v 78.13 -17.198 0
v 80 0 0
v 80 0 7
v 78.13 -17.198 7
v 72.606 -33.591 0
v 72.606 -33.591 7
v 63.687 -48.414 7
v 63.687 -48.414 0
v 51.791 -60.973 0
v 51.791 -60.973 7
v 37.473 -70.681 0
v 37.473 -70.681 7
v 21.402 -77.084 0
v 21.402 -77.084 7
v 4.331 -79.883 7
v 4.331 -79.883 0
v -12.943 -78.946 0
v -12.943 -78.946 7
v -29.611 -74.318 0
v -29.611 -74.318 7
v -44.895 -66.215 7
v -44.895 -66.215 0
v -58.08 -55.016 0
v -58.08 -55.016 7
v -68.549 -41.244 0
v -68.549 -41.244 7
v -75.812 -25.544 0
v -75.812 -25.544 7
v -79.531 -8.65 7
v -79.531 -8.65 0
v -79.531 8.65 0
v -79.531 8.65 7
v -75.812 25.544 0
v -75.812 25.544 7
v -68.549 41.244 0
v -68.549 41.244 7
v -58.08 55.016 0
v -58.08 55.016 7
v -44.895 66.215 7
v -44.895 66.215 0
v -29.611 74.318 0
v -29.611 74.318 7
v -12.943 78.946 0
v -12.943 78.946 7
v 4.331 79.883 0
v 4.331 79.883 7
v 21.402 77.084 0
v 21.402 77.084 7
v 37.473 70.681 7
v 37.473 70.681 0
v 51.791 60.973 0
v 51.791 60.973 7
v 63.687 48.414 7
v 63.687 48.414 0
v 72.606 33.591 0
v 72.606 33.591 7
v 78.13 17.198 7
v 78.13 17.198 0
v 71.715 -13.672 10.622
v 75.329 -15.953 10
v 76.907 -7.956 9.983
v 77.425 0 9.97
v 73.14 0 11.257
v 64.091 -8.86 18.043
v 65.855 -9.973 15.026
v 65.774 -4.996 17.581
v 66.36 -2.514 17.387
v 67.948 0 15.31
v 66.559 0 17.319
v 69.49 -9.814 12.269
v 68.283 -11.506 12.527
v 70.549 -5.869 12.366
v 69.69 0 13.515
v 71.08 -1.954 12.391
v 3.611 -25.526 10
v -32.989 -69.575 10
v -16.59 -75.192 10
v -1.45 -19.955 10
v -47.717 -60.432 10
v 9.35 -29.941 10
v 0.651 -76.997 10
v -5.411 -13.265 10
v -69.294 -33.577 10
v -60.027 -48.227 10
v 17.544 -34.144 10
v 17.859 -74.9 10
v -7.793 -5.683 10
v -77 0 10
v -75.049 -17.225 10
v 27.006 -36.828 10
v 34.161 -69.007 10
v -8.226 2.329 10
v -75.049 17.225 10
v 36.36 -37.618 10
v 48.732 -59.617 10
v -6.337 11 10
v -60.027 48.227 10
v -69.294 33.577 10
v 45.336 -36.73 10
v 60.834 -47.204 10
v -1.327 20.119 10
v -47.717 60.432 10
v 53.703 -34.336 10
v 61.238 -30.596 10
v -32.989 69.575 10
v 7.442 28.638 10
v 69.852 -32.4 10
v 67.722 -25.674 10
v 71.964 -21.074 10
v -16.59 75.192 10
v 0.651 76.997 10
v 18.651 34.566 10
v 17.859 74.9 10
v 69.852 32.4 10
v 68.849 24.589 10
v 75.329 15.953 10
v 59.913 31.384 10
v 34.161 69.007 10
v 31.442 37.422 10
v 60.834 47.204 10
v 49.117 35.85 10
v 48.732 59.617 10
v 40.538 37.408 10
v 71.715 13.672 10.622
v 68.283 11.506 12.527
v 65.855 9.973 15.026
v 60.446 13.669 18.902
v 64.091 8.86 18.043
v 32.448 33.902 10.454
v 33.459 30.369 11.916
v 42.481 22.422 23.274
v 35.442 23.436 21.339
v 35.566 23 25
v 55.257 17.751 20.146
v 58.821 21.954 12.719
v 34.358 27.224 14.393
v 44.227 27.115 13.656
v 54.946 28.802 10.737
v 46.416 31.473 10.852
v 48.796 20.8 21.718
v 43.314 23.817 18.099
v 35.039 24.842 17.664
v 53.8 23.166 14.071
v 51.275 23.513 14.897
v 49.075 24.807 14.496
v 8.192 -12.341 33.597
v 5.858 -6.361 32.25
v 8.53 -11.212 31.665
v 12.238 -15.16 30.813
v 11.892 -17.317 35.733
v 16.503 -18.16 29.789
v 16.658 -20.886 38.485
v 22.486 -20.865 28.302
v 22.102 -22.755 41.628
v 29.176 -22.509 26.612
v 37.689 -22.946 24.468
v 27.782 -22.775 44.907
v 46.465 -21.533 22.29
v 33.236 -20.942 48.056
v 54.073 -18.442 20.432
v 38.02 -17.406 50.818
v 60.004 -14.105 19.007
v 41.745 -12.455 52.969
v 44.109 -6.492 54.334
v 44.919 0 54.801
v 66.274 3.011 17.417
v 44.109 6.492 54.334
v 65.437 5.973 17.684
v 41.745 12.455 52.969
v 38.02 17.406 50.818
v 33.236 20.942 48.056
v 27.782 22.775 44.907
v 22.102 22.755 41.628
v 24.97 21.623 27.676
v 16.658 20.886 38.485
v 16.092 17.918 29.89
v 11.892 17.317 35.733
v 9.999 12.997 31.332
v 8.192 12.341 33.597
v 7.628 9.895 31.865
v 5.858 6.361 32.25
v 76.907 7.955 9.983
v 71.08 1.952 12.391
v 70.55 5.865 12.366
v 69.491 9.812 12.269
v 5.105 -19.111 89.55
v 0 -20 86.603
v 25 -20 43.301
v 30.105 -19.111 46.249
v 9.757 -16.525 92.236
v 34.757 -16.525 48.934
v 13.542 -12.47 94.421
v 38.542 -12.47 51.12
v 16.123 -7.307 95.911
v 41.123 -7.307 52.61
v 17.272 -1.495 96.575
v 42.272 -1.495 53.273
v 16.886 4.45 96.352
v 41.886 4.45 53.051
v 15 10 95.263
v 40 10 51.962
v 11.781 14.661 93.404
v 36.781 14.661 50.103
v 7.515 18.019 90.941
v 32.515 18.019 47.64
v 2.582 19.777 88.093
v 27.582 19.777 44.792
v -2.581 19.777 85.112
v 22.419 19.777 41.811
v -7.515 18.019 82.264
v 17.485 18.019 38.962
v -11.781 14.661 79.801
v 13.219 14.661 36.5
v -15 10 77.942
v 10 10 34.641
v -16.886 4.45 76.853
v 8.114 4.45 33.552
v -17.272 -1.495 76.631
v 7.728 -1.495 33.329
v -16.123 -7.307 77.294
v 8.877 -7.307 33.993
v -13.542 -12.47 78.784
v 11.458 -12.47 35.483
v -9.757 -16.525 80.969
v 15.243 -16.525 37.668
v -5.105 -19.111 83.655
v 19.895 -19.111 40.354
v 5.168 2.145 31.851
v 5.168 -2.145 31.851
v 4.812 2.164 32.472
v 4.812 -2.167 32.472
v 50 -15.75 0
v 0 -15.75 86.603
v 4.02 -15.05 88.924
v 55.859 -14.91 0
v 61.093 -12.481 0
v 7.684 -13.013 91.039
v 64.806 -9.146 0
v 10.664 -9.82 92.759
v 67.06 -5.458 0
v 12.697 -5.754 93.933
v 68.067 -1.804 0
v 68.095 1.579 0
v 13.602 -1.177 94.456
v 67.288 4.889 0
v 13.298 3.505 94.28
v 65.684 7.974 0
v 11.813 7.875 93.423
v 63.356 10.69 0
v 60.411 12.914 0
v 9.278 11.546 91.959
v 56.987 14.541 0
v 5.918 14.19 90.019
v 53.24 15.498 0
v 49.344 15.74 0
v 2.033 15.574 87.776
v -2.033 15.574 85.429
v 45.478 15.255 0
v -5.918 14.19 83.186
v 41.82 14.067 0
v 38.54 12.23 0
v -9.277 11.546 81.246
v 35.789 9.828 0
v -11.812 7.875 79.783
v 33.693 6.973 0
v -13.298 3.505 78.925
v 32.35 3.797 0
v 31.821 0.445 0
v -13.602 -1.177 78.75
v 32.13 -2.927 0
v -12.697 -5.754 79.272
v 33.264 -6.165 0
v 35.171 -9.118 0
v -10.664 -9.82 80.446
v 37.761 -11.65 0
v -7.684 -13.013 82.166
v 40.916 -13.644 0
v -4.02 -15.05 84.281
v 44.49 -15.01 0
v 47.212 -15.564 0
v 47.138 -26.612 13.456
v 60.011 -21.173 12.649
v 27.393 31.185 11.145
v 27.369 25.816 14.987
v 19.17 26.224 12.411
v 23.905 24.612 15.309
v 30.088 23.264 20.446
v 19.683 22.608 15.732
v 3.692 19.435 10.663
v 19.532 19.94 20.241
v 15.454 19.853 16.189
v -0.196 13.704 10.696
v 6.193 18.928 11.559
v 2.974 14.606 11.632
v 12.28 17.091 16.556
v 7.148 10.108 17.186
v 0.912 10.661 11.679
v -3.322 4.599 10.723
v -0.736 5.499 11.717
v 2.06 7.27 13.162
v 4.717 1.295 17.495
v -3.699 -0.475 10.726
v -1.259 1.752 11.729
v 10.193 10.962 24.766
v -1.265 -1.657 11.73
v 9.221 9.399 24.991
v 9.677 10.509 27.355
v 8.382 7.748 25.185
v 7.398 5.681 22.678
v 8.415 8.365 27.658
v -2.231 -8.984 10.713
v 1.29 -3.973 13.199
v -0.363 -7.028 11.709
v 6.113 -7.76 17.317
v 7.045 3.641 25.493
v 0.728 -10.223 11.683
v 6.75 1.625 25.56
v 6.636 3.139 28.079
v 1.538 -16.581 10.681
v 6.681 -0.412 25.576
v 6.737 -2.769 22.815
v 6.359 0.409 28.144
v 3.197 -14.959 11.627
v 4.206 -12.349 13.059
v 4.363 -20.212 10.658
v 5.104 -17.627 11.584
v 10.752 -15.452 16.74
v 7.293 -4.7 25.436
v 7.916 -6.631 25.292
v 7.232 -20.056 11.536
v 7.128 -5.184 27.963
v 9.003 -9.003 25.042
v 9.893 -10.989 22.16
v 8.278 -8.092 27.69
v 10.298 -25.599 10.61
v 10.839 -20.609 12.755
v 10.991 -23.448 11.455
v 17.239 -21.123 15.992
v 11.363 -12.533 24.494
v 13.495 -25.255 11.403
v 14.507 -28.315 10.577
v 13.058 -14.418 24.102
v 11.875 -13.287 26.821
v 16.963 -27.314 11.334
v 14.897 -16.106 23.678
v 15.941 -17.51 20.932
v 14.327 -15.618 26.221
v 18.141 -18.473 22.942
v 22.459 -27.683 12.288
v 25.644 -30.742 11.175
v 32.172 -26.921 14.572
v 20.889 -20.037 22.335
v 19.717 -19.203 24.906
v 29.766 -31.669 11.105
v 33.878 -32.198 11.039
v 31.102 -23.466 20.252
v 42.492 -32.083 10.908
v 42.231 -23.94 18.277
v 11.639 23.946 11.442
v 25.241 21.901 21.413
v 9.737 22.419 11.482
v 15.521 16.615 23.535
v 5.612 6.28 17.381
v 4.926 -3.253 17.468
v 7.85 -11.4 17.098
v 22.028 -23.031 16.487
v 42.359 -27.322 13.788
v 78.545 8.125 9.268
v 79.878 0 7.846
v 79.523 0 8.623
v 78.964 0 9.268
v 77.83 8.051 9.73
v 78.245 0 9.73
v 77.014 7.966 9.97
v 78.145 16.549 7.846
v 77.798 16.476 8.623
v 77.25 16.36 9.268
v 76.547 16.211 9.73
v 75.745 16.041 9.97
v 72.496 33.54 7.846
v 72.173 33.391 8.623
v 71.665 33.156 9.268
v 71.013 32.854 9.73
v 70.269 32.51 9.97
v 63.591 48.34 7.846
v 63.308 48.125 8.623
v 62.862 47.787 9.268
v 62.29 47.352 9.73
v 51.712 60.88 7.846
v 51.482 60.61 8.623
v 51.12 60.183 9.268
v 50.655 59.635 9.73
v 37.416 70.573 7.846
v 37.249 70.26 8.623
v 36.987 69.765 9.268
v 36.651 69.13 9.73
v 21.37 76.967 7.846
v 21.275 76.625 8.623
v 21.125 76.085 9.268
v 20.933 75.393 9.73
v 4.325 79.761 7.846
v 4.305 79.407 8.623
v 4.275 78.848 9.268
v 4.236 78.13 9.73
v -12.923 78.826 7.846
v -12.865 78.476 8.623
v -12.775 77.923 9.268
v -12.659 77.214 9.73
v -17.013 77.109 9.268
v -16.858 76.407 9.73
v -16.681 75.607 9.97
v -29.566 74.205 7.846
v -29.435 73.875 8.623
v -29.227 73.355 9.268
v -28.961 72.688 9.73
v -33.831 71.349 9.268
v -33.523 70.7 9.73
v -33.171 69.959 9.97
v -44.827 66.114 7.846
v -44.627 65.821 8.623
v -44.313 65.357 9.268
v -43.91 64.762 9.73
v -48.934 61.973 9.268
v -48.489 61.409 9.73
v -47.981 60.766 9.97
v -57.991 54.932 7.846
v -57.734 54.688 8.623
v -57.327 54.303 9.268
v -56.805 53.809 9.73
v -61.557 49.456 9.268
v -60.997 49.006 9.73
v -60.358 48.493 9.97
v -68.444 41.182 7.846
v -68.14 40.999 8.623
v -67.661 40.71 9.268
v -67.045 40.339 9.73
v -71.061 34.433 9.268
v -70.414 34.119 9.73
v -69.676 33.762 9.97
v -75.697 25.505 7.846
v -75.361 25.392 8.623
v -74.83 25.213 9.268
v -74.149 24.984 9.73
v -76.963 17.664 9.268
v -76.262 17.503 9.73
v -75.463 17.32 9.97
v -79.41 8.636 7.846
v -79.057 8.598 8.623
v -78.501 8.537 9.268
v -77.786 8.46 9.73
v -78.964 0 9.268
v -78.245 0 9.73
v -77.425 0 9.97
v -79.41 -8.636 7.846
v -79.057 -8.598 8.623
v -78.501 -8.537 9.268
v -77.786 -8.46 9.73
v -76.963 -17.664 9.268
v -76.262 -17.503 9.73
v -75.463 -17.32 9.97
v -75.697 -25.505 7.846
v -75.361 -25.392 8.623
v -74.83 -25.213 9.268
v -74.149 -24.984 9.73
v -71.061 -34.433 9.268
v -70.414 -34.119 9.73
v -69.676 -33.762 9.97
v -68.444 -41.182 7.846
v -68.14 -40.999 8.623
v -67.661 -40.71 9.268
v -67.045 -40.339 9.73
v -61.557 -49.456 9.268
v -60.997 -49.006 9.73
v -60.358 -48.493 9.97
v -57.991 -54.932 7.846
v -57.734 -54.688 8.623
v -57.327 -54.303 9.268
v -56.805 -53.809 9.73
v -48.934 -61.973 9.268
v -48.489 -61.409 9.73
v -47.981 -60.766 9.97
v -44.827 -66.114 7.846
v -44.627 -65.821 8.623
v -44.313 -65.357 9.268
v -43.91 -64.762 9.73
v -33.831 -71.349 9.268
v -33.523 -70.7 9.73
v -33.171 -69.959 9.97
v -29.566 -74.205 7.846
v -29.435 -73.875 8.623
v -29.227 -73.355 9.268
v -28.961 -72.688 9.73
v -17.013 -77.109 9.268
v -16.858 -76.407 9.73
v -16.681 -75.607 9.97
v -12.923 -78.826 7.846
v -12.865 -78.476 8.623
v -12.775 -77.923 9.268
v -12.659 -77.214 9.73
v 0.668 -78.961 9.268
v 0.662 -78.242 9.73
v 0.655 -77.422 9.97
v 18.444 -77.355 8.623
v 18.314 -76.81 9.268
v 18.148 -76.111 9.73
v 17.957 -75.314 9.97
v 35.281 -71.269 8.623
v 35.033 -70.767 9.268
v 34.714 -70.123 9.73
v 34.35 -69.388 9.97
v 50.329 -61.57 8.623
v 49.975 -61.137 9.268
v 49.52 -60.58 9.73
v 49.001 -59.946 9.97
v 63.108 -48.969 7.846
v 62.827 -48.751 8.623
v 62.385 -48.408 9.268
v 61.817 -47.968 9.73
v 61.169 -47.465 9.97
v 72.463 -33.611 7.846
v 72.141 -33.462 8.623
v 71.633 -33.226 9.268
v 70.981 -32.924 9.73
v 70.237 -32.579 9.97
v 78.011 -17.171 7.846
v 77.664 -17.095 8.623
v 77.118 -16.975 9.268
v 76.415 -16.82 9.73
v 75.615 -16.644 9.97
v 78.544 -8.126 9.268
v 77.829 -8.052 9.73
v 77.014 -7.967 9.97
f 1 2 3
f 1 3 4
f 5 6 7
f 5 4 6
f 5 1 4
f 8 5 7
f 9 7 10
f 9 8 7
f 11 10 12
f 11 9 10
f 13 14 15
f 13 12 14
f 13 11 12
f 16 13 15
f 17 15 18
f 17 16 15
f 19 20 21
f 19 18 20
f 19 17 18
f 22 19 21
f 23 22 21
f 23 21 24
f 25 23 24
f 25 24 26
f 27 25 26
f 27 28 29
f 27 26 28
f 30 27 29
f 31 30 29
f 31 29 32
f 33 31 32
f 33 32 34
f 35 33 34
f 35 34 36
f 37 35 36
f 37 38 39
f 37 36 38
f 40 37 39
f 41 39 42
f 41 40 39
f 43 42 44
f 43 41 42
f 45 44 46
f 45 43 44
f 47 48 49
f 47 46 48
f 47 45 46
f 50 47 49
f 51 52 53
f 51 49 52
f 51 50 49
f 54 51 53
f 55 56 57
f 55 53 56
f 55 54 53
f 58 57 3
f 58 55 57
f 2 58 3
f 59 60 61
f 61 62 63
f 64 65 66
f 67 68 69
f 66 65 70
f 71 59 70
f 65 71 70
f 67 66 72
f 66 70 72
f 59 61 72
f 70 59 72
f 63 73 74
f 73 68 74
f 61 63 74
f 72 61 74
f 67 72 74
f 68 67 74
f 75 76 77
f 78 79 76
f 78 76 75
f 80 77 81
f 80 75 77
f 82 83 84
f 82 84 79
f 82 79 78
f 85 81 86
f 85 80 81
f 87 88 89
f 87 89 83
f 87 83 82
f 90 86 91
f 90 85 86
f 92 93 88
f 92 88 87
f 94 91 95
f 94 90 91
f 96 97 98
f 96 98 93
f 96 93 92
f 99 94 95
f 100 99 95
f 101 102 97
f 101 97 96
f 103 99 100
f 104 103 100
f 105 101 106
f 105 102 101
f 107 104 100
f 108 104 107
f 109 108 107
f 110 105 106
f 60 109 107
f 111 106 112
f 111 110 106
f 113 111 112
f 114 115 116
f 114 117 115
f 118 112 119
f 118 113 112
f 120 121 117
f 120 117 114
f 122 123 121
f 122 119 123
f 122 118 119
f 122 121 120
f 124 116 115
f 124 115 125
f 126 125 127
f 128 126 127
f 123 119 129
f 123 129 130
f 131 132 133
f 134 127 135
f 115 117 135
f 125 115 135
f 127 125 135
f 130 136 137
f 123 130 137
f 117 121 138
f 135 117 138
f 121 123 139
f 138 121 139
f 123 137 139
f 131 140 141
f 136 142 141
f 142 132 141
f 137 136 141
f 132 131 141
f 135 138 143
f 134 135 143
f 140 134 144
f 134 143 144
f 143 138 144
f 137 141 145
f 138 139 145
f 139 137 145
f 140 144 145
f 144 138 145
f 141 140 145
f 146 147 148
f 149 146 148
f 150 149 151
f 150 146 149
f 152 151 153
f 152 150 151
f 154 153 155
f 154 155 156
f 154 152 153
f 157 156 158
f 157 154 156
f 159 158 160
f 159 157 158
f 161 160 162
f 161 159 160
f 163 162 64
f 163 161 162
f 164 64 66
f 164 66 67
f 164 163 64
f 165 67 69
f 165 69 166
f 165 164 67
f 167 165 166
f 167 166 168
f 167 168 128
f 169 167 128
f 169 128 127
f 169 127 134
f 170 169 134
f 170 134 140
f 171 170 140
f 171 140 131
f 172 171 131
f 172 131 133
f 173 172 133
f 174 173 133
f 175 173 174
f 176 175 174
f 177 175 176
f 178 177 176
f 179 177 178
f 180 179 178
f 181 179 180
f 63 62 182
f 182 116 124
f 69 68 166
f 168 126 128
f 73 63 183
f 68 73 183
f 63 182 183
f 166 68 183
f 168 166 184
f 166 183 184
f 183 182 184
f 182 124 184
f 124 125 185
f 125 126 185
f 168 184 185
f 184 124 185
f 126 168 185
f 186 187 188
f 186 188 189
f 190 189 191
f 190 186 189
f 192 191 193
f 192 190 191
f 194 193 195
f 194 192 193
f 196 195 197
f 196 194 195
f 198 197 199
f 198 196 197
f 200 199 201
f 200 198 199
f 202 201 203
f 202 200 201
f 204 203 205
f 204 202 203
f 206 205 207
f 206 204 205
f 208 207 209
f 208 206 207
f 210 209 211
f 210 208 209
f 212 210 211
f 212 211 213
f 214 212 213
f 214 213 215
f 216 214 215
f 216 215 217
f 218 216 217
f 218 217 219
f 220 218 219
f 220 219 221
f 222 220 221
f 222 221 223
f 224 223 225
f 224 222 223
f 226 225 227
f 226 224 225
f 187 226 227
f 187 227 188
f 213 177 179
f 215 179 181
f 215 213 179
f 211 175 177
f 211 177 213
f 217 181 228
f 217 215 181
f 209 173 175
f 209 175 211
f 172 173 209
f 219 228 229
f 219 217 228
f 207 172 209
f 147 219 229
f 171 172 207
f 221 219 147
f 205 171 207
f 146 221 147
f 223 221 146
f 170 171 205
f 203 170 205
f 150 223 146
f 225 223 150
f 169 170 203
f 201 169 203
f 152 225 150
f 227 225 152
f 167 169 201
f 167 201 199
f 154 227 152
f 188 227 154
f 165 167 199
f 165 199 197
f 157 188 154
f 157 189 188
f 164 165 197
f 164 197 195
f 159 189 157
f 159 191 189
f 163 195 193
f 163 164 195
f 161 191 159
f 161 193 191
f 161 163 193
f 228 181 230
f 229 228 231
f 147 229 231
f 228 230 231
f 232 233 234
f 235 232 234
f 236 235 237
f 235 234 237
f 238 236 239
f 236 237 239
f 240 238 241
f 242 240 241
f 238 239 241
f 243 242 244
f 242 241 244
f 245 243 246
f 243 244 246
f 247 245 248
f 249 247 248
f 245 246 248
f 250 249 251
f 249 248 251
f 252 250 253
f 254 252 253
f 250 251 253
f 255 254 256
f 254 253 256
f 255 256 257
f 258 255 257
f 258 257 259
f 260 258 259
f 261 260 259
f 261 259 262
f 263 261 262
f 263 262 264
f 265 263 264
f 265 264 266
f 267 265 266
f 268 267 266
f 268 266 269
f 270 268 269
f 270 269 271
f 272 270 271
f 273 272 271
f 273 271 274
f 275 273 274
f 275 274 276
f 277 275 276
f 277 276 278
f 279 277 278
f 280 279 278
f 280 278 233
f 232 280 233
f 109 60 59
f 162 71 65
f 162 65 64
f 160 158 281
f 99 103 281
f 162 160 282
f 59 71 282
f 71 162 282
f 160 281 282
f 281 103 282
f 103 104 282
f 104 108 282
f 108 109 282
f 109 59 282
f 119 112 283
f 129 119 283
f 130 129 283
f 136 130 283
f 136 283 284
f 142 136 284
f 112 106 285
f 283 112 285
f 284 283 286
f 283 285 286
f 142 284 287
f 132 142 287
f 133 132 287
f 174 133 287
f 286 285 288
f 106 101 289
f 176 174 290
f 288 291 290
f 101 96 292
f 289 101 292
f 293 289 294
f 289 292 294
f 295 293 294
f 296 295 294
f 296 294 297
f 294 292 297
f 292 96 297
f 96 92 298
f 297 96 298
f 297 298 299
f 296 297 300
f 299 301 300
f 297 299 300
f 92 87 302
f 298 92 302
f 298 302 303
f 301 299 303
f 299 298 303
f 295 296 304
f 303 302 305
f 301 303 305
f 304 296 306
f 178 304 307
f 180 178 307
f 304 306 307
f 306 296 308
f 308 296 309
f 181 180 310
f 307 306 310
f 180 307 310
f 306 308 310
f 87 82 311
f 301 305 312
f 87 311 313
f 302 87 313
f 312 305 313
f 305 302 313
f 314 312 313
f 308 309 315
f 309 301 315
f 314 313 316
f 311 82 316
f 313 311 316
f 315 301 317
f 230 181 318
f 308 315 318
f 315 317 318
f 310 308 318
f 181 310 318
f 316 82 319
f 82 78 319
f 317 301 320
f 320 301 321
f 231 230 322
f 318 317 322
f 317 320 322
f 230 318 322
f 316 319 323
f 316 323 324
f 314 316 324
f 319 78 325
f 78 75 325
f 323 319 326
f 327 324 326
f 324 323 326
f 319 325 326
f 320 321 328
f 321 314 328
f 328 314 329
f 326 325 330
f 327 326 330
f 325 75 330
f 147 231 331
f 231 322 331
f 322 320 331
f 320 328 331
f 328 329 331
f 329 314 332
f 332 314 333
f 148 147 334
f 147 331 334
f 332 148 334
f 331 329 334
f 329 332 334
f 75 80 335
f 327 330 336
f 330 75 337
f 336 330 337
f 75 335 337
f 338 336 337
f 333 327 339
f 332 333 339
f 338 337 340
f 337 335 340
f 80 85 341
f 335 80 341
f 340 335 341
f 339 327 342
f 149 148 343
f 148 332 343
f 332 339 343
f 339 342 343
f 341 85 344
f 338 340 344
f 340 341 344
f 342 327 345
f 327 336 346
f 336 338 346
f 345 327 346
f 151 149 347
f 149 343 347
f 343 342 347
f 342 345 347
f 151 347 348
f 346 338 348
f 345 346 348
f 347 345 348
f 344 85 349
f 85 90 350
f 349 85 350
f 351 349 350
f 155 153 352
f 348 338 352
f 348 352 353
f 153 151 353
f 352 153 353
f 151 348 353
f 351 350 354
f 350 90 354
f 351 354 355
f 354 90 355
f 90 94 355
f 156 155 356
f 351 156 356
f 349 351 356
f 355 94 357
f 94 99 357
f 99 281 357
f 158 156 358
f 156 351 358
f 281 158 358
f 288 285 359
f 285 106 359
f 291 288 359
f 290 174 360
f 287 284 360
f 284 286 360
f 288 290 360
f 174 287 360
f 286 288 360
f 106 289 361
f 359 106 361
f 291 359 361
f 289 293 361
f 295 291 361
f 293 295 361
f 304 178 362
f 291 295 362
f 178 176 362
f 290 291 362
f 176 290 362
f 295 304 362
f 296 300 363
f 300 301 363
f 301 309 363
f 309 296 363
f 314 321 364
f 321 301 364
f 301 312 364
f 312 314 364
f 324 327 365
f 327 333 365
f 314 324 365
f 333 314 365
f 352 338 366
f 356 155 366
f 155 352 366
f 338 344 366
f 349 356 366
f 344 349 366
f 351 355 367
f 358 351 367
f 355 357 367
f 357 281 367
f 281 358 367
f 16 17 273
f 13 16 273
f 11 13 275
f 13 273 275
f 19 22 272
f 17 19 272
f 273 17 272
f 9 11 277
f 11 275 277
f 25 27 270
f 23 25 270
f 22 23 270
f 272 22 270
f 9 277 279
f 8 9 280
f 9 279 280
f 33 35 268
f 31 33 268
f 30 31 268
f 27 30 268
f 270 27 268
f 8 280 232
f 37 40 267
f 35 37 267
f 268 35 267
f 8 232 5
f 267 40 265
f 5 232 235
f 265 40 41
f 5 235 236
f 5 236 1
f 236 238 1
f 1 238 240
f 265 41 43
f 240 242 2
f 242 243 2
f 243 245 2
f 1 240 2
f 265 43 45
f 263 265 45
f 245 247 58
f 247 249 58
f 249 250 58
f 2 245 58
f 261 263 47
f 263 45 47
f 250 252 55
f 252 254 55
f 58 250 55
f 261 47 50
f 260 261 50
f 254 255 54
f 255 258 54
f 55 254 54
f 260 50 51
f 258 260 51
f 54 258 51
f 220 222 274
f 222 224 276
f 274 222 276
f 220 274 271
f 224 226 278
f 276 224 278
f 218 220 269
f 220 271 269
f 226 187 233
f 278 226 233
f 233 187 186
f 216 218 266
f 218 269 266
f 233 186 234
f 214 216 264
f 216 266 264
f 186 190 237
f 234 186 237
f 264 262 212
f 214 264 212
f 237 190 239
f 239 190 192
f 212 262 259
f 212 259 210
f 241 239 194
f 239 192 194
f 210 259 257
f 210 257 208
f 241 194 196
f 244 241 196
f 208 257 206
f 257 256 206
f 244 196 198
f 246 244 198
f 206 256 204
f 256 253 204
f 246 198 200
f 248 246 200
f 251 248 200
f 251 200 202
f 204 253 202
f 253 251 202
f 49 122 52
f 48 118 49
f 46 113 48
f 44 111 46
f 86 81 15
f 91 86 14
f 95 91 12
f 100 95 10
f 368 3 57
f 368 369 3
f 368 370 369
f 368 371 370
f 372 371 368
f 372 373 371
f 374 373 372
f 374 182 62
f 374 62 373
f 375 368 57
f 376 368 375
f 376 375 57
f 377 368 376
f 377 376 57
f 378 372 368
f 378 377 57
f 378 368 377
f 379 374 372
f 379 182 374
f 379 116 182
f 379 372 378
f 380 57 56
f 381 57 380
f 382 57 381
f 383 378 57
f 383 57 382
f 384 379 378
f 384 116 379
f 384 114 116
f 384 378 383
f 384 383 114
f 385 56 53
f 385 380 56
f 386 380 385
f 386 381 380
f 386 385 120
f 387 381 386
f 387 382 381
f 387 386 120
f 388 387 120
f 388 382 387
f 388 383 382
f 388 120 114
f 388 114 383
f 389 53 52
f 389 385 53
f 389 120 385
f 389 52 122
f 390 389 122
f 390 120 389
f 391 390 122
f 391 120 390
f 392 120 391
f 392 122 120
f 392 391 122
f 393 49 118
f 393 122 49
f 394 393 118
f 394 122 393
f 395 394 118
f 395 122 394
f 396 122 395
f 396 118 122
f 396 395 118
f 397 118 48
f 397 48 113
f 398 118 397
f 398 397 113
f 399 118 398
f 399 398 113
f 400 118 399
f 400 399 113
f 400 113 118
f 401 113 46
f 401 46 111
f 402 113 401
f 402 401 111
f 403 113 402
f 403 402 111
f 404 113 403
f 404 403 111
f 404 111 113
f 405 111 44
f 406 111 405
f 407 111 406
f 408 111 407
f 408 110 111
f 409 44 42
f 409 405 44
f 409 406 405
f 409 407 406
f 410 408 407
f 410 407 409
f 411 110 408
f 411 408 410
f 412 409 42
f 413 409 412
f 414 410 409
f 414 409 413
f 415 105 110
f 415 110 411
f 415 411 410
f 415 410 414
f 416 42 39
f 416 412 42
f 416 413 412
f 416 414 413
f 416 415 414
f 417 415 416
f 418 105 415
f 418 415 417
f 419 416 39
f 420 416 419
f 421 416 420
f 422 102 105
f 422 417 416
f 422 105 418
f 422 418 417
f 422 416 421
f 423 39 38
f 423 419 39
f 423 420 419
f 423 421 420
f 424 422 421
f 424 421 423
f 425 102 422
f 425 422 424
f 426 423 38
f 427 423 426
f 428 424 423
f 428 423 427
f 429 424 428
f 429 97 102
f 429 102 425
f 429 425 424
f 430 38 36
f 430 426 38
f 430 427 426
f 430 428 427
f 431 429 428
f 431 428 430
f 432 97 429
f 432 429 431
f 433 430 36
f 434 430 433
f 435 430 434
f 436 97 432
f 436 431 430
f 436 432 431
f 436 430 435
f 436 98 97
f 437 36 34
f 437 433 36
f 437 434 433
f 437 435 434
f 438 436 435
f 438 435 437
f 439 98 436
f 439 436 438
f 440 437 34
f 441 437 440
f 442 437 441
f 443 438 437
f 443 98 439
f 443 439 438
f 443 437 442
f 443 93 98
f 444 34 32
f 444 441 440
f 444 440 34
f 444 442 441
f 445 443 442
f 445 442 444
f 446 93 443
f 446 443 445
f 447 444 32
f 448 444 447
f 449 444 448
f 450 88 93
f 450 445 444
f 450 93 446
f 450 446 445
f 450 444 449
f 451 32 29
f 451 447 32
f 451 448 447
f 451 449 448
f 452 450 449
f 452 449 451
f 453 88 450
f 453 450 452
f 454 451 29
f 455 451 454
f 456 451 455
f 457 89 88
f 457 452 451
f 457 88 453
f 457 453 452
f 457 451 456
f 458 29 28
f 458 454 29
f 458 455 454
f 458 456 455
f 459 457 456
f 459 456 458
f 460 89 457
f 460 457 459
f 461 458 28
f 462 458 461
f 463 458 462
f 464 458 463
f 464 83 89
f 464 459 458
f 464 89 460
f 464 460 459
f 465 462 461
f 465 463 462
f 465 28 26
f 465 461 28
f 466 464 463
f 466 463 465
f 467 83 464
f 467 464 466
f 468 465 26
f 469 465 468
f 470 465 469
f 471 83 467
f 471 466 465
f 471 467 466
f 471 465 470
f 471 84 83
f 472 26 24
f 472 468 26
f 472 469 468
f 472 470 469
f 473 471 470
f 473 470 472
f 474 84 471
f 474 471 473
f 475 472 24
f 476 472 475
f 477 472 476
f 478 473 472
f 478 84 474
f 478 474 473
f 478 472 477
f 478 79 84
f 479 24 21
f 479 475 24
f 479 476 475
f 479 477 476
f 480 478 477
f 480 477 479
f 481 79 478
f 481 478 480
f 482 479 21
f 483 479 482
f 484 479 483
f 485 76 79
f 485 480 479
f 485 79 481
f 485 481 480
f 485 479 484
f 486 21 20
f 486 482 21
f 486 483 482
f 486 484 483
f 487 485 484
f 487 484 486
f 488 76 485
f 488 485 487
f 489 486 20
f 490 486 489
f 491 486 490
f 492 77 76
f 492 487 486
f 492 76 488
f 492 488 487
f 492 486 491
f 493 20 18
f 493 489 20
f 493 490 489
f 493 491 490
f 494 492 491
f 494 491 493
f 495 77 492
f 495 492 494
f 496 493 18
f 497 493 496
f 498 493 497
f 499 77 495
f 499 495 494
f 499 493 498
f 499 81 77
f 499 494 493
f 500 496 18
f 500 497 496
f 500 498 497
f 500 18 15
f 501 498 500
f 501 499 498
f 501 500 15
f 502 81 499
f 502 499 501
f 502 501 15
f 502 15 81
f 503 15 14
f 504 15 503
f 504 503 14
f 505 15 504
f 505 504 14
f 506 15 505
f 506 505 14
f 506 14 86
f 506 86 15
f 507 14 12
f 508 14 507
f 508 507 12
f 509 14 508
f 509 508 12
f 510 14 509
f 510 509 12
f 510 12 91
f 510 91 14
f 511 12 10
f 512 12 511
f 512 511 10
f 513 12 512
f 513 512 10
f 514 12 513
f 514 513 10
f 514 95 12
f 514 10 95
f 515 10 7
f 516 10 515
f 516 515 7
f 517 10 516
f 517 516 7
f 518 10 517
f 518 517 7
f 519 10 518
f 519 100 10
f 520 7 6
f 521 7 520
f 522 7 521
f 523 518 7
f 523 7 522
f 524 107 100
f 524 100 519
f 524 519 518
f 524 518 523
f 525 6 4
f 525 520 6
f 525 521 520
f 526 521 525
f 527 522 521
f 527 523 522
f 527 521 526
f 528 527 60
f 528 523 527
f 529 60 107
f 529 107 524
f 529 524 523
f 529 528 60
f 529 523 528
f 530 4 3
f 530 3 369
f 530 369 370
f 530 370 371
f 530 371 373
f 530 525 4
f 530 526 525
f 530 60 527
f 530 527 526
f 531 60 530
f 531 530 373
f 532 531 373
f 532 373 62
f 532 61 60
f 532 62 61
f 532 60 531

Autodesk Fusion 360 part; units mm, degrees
sketch "Skizze1" plane through (0, 0, 0) normal (0, 0, 1) x (1, 0, 0)
  circle A0 centre (0, 0) radius 80
  dimension "d1" = 160
extrude "Extrusion1" add sketch "Skizze1" along normal blind 10
fillet "Abrundung1" radius 3 1 edges at (-74.5862, -28.9292, 10)
sketch "Skizze2" plane through (0, 0, 0) normal (0, 1, 0) x (1, 0, 0)
  line L0 (0, 0) -> (50, 0) construction
  line L1 (50, 0) -> (50, -40) construction
  line L2 (50, -40) -> (0, -40) construction
  line L3 (0, -40) -> (0, 0) construction
  line L4 (50, 0) -> (0, -86.6025) construction
  line L5 (50, 0) -> (160, 0) construction
  line L6 (0, -86.6025) -> (19.9186, -98.1025)
  line L7 (0, -86.6025) -> (23, -86.6025) construction
  line L8 (0, -86.6025) -> (-19.9186, -75.1025)
  dimension "d6" = 50
  dimension "d7" = 40
  dimension "d8" = 120
  dimension "d9" = 100
  dimension "d10" = 30
  dimension "d11" = 23
sketch "Skizze3" plane through (0, 0, 0) normal (1, 0, 0) x (0, 1, 0)
  line L0 (0, 86.6025) -> (0, 75.1025)
  line L1 (0, 86.6025) -> (0, 98.1025)
  line L2 (0, 86.6025) -> (-23, 86.6025)
  line L3 (0, 86.6025) -> (23, 86.6025)
  point P0 (0, 75.1025)
  point P1 (0, 86.6025)
  dimension "d12" = 23
  dimension "d13" = 23
ref_plane "Arbeitsebene1" through (0, 0, 86.6025) normal (0.5, 0, -0.866) x (0, 1, 0)
sketch "Skizze4" plane through (-37.5, 0, 64.9519) normal (0.5, 0, -0.866) x (0, 1, 0)
  line L0 (0, 43.3013) -> (23, 43.3013)
  line L1 (0, 43.3013) -> (-23, 43.3013)
  line L2 (0, 43.3013) -> (0, 20.3013)
  line L3 (0, 43.3013) -> (0, 66.3013)
  circle A0 centre (0, 43.3013) radius 23
  circle A1 centre (0, 43.3013) radius 15.75
  circle A2 centre (0, 43.3013) radius 20
  point P0 (23, 43.3013)
  point P1 (0, 20.3013)
  point P2 (-23, 43.3013)
  point P3 (0, 66.3013)
  point P4 (0, 43.3013)
  dimension "d15" = 46
  dimension "d20" = 31.5
  dimension "d21" = 40
extrude "Extrusion2" add sketch "Skizze4" along normal blind 120
fillet "Abrundung2" radius 15 1 edges at (17.6684, 0, 10)
sketch "Skizze5" plane through (-37.5, 0, 64.9519) normal (-0.5, 0, 0.866) x (0, -1, 0)
  circle A0 centre (0, 43.3013) radius 23
  circle A1 centre (0, 43.3013) radius 15.75
  dimension "d22" = 31.5
extrude "Extrusion3" cut sketch "Skizze5" against normal blind 170 contours A1
sketch "Skizze6" plane through (-37.5, 0, 64.9519) normal (-0.5, 0, 0.866) x (0, -1, 0)
  circle A0 centre (0, 43.3013) radius 15.75
  circle A1 centre (0, 43.3013) radius 23
  circle A2 centre (0, 43.3013) radius 20
  dimension "d25" = 40
extrude "Extrusion4" cut sketch "Skizze6" against normal blind 50 contours A1
sketch "Skizze7" plane through (0, 0, 0) normal (0, 0, 1) x (1, 0, 0)
  line L0 (-80, 80) -> (111.2852, 80)
  line L1 (111.2852, 80) -> (111.2852, -85.555)
  line L2 (111.2852, -85.555) -> (-80, -85.555)
  line L3 (-80, -85.555) -> (-80, 80)
extrude "Extrusion5" cut sketch "Skizze7" against normal blind 90
